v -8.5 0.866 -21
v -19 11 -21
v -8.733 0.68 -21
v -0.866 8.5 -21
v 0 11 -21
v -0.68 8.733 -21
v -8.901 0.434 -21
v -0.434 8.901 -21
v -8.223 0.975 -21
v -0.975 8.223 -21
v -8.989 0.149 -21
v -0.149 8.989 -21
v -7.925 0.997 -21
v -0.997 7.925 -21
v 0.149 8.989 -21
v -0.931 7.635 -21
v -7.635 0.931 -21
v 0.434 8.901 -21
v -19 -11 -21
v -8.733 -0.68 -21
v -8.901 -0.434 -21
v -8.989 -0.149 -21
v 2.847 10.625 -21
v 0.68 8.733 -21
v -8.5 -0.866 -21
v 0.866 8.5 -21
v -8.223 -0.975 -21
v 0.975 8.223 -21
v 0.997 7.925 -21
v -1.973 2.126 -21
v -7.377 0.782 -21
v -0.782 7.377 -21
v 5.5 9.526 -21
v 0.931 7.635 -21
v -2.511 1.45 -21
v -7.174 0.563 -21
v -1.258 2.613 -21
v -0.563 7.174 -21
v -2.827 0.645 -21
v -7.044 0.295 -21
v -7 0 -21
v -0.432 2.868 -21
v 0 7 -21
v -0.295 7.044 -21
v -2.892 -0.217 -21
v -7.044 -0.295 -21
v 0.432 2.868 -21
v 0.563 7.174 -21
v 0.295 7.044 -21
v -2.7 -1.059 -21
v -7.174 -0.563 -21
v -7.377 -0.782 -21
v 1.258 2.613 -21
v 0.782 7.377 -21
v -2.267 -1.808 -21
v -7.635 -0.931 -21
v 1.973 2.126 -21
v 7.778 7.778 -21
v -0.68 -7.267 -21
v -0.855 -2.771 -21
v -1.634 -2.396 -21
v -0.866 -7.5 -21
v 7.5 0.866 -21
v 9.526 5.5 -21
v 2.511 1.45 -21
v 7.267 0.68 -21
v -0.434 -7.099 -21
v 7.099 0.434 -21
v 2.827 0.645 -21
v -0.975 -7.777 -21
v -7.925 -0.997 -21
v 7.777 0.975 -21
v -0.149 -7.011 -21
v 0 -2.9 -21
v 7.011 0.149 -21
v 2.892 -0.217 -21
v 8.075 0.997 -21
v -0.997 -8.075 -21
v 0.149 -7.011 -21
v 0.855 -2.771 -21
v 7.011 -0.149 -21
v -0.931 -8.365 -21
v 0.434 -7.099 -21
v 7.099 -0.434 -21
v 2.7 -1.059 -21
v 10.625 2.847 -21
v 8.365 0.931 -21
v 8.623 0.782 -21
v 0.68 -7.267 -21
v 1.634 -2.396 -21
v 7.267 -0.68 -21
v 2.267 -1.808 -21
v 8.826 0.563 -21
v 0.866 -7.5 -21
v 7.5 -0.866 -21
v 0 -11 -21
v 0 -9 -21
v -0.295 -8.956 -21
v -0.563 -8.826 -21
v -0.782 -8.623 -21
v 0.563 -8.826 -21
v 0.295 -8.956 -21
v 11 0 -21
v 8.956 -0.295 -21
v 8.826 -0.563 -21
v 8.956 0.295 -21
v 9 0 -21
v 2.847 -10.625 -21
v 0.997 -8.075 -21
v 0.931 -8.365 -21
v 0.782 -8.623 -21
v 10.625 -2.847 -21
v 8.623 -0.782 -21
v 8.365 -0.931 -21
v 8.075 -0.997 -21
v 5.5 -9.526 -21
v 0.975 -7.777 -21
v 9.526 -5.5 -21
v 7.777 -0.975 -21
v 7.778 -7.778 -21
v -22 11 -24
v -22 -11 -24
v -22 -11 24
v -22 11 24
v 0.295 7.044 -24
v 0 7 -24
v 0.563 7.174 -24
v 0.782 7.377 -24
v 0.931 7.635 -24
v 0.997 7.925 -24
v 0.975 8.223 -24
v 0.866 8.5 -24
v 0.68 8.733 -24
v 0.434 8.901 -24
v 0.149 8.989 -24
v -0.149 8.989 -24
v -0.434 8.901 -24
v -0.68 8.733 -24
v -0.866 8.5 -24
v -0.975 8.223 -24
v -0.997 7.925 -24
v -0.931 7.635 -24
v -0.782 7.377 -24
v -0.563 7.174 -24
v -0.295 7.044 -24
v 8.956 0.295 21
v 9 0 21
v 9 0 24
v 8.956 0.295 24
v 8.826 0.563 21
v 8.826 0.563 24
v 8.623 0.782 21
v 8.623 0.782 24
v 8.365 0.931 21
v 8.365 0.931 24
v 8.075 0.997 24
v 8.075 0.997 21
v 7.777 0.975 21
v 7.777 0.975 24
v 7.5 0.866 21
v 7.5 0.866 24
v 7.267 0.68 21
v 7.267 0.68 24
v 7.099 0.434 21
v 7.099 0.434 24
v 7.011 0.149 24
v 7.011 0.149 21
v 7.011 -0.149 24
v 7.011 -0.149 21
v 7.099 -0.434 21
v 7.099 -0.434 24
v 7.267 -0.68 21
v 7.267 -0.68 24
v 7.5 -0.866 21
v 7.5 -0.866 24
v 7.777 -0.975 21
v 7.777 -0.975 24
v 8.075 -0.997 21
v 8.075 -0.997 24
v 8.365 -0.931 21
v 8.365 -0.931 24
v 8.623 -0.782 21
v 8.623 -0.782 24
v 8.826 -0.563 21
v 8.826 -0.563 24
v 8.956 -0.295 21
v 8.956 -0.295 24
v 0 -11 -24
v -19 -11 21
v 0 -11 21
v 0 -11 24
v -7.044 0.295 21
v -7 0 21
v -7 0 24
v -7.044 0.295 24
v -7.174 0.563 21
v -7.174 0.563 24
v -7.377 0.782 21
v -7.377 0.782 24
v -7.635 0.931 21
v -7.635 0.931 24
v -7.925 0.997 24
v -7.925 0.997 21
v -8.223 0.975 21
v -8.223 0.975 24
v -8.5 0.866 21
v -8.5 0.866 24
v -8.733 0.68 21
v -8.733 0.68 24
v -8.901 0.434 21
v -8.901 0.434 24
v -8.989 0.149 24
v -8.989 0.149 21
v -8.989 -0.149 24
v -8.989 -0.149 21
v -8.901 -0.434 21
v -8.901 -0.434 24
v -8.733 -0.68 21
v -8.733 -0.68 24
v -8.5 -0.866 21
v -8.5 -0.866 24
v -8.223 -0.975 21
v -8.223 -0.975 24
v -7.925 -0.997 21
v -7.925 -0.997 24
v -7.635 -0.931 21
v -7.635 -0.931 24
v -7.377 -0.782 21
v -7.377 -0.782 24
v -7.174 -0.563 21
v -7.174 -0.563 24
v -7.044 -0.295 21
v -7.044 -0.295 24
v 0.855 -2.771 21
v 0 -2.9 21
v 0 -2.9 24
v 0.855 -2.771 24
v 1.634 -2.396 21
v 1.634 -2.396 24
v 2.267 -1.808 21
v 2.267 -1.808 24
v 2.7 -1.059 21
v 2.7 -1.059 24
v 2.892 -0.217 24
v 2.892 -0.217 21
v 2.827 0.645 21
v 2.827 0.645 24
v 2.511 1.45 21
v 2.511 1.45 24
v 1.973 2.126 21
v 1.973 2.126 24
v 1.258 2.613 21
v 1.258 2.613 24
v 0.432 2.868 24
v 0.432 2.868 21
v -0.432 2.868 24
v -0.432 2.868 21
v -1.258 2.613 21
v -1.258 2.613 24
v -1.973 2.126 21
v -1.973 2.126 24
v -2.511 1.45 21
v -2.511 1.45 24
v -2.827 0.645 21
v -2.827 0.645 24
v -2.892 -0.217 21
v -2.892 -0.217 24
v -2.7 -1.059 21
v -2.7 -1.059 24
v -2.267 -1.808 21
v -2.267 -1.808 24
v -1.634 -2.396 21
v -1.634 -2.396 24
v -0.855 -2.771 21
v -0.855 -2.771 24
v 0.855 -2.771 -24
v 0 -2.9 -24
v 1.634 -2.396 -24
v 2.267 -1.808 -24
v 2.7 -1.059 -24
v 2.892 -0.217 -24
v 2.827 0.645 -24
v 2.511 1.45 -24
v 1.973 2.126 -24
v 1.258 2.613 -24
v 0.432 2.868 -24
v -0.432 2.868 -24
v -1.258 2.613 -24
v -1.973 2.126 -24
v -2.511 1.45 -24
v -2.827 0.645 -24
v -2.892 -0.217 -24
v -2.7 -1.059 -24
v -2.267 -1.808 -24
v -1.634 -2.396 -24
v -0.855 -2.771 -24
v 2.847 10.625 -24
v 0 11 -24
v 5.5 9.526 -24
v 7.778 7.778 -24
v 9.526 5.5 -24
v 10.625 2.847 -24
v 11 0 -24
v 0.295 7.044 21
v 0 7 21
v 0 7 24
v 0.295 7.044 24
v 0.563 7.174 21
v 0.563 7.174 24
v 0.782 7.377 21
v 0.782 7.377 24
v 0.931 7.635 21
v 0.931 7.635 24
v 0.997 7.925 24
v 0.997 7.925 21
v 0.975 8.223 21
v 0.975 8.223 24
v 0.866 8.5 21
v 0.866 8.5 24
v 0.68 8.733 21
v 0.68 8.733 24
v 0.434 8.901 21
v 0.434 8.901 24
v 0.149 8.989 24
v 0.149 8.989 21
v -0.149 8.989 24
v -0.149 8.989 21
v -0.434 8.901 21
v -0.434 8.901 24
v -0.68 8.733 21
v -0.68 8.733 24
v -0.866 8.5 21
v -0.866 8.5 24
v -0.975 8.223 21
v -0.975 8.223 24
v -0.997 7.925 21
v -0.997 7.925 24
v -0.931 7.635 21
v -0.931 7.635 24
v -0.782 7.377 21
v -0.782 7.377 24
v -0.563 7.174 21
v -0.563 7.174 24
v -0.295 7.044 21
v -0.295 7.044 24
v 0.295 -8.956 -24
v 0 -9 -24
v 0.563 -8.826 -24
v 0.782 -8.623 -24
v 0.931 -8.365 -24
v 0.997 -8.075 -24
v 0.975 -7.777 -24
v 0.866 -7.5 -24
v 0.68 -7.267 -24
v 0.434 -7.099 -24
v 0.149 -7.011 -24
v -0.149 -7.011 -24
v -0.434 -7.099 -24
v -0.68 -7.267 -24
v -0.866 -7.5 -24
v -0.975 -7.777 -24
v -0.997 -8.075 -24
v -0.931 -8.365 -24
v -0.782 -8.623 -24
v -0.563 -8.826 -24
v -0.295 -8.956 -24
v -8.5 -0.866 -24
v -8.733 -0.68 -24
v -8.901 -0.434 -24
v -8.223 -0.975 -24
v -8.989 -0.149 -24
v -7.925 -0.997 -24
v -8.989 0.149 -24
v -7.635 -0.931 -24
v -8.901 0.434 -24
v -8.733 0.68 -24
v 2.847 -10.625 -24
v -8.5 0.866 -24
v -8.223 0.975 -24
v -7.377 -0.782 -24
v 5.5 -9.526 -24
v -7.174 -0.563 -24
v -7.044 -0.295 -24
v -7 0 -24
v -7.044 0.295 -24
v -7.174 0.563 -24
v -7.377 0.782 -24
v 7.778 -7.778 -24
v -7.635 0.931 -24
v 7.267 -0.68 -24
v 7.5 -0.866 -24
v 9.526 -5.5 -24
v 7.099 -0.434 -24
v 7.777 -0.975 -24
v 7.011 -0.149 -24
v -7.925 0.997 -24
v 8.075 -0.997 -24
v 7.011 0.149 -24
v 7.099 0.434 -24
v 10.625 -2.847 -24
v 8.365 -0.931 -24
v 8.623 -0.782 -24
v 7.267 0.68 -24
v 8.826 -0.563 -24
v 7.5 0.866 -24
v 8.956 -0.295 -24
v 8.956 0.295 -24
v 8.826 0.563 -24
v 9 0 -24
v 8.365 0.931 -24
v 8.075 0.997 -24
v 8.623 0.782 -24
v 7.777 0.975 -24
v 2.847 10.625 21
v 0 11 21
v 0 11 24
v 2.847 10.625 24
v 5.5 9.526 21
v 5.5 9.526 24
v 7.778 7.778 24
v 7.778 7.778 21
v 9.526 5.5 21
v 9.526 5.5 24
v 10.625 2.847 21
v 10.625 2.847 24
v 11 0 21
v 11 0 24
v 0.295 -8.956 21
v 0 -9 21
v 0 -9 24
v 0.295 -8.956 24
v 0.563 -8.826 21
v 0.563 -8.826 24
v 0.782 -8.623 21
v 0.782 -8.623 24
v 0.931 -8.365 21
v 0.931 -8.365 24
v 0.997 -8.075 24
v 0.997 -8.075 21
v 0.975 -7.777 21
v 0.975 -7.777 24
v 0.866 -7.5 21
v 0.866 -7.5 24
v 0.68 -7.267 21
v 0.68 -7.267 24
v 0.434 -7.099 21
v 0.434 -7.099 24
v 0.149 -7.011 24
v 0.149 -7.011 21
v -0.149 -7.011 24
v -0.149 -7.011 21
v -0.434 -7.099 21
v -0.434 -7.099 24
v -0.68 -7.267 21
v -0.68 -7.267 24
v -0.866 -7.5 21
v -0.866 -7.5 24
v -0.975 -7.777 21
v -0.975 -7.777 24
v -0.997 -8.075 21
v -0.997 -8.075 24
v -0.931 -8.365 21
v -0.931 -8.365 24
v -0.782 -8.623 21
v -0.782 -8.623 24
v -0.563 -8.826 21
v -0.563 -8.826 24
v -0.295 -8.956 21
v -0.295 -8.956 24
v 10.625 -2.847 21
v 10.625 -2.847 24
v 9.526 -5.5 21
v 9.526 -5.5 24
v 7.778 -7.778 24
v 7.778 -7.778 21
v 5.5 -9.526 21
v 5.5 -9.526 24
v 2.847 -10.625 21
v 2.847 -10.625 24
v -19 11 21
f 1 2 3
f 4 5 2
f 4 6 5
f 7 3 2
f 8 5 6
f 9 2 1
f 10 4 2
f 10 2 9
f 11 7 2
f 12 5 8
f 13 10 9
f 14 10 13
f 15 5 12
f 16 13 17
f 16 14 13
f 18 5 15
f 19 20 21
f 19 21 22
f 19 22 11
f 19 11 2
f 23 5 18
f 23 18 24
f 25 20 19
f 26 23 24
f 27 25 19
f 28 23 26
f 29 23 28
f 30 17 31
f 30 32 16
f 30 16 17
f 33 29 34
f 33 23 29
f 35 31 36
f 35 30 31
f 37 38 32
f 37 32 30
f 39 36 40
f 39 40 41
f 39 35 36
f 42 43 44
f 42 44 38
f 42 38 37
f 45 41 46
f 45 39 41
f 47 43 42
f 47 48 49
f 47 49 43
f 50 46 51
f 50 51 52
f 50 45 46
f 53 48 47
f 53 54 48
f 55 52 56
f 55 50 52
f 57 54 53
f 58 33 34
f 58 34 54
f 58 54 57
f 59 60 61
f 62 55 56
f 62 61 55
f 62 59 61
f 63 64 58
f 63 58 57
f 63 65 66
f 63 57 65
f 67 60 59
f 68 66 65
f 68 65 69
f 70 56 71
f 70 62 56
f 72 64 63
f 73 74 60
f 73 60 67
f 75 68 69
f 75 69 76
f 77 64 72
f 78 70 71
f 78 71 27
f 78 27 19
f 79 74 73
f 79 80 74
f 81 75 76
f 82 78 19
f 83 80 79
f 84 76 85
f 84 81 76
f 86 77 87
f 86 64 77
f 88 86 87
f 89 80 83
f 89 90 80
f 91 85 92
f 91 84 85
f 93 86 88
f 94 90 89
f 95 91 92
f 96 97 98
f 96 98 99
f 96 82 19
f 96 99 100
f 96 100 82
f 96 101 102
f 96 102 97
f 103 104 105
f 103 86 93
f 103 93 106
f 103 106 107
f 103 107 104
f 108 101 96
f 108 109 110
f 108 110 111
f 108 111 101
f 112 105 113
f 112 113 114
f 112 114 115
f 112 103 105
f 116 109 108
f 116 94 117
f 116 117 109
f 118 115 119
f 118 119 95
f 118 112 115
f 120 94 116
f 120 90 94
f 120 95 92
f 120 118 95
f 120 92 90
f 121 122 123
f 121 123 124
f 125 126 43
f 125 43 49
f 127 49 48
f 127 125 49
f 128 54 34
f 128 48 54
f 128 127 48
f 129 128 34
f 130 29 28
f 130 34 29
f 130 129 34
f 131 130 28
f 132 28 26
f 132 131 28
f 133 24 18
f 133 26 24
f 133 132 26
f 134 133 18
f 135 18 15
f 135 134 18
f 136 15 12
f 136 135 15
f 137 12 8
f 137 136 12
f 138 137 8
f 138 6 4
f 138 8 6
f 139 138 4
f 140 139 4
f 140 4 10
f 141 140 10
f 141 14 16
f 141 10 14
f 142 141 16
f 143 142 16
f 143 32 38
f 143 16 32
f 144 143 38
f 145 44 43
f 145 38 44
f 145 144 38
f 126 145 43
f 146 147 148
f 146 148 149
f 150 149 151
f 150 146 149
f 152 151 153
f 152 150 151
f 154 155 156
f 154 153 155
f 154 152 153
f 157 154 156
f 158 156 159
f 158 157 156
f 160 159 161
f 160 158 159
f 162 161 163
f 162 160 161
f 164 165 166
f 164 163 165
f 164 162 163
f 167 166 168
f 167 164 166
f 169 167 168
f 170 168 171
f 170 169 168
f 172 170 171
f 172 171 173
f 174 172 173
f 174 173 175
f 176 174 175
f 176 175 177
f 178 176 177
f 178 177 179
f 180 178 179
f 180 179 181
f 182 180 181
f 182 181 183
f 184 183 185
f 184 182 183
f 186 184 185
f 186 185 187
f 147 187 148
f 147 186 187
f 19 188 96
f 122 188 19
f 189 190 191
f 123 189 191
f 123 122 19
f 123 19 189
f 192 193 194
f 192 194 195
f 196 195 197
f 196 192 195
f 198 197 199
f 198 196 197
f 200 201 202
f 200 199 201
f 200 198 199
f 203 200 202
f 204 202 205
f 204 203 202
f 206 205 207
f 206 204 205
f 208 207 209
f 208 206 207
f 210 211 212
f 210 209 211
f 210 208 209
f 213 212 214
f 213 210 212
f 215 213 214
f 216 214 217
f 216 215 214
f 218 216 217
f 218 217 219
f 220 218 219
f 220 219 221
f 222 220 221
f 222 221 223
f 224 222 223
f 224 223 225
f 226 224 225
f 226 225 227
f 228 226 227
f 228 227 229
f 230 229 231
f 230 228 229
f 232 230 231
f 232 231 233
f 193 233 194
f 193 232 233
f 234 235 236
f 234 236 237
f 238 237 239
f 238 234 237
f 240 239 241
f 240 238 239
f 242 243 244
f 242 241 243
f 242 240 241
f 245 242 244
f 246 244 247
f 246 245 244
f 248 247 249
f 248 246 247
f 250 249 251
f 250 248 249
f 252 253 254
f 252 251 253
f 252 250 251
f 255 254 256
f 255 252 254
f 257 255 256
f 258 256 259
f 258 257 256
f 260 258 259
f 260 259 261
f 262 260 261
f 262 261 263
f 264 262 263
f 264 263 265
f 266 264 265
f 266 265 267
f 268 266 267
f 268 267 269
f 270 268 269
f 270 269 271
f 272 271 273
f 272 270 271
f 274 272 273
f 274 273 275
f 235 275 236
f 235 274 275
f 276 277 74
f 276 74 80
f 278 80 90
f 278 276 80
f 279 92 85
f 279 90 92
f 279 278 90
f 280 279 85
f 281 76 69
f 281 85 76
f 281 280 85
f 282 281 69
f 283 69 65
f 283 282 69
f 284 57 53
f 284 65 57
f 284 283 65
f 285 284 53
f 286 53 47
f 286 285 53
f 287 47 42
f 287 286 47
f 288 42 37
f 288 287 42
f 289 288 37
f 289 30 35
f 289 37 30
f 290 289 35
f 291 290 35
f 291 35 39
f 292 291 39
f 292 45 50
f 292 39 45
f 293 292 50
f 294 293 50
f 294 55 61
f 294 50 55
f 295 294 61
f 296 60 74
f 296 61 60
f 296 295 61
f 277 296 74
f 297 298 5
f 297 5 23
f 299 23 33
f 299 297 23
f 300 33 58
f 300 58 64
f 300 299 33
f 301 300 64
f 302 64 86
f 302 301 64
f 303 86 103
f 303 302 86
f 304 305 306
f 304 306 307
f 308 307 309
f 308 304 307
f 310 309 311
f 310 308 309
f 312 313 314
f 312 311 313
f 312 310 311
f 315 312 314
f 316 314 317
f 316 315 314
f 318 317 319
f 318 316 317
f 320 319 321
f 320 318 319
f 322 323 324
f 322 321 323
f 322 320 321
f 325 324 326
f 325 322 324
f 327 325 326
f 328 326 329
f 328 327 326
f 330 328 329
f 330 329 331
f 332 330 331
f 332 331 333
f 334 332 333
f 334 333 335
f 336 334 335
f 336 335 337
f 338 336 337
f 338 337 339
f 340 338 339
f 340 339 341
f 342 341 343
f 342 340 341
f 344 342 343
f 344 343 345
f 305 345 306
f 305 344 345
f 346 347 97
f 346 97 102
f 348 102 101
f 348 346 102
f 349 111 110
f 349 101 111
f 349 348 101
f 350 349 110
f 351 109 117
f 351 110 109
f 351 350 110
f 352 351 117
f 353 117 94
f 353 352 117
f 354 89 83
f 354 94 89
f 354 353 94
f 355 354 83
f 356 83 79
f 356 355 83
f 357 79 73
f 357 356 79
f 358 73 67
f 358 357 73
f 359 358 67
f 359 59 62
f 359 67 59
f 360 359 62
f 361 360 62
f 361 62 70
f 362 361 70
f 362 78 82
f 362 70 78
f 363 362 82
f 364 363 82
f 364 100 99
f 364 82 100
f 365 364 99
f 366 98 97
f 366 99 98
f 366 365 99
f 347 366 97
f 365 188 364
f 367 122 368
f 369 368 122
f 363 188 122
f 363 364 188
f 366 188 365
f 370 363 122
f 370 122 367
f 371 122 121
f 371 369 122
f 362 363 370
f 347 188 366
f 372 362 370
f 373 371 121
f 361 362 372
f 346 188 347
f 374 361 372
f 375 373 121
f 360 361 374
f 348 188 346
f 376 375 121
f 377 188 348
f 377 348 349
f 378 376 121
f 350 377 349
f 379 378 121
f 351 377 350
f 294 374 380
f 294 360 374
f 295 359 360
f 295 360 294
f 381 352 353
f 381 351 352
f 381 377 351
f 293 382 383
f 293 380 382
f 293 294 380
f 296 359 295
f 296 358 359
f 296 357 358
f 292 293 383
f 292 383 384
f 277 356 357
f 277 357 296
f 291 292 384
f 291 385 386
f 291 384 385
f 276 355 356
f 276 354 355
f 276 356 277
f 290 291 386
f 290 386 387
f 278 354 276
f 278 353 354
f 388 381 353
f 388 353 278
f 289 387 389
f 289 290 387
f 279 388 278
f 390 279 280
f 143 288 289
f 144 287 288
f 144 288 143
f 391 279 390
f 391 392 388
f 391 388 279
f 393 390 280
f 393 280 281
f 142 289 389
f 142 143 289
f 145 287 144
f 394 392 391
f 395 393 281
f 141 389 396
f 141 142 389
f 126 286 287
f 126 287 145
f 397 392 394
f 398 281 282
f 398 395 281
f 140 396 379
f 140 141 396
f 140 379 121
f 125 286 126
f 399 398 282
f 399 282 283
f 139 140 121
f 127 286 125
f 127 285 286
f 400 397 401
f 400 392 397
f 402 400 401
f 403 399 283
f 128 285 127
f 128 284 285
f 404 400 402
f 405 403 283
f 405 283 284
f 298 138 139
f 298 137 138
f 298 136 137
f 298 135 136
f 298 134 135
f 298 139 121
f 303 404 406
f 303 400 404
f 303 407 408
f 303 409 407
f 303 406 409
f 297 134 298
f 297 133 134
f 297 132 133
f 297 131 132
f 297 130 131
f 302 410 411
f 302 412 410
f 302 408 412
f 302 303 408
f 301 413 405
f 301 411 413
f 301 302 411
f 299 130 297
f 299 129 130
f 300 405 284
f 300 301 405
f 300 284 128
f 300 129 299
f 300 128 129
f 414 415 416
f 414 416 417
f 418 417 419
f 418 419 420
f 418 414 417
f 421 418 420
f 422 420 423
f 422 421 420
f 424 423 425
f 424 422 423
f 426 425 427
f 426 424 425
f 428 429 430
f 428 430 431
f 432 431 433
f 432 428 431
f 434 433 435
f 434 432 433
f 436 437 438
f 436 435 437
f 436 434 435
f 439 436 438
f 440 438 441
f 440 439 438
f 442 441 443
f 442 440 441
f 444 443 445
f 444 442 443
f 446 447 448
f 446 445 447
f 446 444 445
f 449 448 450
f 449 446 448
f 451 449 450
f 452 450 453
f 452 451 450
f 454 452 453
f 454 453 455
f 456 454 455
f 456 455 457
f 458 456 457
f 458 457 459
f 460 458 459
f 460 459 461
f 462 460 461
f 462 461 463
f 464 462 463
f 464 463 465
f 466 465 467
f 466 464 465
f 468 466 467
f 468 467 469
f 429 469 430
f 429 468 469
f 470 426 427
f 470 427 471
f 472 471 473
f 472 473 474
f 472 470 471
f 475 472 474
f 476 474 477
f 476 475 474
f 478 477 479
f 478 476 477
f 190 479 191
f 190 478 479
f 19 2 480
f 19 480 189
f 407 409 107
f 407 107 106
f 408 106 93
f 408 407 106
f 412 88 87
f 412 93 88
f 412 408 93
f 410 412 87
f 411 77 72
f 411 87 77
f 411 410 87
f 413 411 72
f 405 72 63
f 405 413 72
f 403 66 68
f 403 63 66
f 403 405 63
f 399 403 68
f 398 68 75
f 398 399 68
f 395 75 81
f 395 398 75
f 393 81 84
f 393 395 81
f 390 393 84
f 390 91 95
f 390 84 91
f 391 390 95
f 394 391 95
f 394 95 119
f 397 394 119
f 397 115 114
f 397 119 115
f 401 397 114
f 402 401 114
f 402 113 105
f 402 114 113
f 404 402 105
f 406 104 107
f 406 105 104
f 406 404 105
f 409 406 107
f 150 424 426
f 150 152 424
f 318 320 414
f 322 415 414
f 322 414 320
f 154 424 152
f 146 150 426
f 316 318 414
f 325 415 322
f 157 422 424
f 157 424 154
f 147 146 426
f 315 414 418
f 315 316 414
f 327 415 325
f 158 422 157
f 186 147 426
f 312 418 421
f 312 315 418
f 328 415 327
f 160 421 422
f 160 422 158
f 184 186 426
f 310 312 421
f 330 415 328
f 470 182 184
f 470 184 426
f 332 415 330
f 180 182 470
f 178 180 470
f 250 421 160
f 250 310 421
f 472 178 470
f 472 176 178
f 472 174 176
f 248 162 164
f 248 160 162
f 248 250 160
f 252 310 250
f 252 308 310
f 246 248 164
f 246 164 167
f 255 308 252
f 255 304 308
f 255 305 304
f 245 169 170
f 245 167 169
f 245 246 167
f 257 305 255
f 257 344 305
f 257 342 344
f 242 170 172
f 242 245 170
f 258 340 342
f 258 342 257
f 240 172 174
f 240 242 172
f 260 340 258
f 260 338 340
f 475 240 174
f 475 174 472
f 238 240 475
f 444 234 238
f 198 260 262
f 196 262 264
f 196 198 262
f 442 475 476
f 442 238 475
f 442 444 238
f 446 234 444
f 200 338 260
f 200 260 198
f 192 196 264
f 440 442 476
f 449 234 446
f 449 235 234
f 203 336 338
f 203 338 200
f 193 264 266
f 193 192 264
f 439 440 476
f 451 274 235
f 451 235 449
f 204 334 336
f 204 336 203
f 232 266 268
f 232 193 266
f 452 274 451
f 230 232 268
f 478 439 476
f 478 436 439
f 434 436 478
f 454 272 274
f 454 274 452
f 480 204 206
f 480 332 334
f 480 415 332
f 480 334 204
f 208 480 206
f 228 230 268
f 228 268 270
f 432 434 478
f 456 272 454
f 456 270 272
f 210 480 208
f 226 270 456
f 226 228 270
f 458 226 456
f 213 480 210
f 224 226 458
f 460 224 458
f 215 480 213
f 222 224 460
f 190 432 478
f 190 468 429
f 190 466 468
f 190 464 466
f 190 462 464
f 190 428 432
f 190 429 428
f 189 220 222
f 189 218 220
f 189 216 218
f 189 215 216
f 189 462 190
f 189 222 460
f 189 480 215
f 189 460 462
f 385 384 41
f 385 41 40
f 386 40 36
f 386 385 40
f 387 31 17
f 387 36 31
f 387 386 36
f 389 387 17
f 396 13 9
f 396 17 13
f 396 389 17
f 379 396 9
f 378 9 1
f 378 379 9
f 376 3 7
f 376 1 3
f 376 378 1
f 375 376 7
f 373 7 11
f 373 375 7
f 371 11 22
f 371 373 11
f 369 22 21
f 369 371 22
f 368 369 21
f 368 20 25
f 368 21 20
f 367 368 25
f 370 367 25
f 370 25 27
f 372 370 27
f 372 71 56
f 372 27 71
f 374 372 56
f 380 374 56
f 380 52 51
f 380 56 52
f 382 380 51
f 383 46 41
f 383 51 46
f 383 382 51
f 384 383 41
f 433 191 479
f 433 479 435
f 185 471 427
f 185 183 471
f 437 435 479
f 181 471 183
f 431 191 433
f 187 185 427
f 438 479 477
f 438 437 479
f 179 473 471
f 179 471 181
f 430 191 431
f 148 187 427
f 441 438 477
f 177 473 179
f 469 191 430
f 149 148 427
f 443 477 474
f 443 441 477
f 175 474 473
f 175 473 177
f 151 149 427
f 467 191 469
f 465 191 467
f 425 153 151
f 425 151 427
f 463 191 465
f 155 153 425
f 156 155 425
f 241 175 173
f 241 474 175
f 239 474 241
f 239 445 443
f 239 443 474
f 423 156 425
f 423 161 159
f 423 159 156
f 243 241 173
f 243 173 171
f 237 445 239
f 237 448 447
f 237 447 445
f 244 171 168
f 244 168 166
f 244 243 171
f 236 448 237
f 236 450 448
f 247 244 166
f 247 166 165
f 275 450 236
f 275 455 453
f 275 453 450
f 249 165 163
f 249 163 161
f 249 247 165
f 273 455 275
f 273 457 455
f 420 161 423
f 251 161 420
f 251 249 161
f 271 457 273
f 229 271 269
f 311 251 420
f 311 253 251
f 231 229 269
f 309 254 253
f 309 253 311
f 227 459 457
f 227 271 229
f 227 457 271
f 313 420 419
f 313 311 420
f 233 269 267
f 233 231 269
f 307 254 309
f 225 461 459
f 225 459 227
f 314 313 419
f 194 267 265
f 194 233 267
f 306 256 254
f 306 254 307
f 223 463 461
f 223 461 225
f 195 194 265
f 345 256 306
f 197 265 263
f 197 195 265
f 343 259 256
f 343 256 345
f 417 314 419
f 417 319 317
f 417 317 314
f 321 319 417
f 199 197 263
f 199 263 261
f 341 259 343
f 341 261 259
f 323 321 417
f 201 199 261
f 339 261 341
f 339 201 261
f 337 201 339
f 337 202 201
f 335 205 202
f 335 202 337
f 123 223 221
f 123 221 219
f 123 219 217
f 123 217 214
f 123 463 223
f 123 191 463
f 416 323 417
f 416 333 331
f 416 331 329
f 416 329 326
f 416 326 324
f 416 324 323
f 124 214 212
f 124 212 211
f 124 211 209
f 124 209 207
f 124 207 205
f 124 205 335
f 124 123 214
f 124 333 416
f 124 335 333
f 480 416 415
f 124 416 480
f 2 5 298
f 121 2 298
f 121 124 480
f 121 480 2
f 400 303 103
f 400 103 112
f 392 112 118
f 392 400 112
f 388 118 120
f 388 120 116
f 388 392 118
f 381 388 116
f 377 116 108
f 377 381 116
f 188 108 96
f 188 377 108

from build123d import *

# Parameters (mm, degrees)
SKETCH3_W               = 3
SKETCH3_H               = 22
CUT_EXTRUDE1_DEPTH      = 35.365680555
CUT_EXTRUDE1_DEPTH_BACK = 35.365680555
SKETCH1_R               = 1
SKETCH1_R_2             = 2.9


with BuildPart() as part:
    # Sweep1: sweep along a path in Sketch2
    with BuildLine(Plane(origin=(0, 0, 0), x_dir=(1, 0, 0), z_dir=(0, 1, 0))) as sweep1_path:
        Line((11, -21), (0, -21))
        Line((0, -21), (-19, -21))
        Line((-19, -21), (-19, 21))
        Line((-19, 21), (0, 21))
        Line((0, 21), (11, 21))
    # Sketch3 → Sweep1 (sweep)
    with BuildSketch(Plane(origin=(0, 0, 0), x_dir=(0, 0, -1), z_dir=(1, 0, 0))):
        with Locations((22.5, 0)):
            Rectangle(SKETCH3_W, SKETCH3_H)
    sweep(path=sweep1_path.line, transition=Transition.RIGHT)

    # Sketch1 → Cut-Extrude1 (cut, two sides: drawn at the far end of the back side and taken through both)
    with BuildSketch(Plane.XY.offset(-CUT_EXTRUDE1_DEPTH_BACK)):
        with BuildLine():
            Line((11, 11), (0, 11))
            ThreePointArc((0, 11), (7.778174593, 7.778174593), (11, 0))
            Line((11, 0), (11, 11))
        make_face()
        with Locations((8, 0)):
            Circle(SKETCH1_R)
        with Locations(Location((0, -8, 0), (0, 0, 270))):
            Circle(SKETCH1_R)
        with Locations(Location((0, 0, 0), (0, 0, 270))):
            Circle(SKETCH1_R_2)
        with BuildLine():
            Line((11, -11), (11, 0))
            ThreePointArc((11, 0), (7.778174593, -7.778174593), (0, -11))
            Line((0, -11), (11, -11))
        make_face()
        with Locations(Location((0, 8, 0), (0, 0, 270))):
            Circle(SKETCH1_R)
        with Locations((-8, 0)):
            Circle(SKETCH1_R)
    extrude(amount=CUT_EXTRUDE1_DEPTH + CUT_EXTRUDE1_DEPTH_BACK, mode=Mode.SUBTRACT)


solid = part.part
